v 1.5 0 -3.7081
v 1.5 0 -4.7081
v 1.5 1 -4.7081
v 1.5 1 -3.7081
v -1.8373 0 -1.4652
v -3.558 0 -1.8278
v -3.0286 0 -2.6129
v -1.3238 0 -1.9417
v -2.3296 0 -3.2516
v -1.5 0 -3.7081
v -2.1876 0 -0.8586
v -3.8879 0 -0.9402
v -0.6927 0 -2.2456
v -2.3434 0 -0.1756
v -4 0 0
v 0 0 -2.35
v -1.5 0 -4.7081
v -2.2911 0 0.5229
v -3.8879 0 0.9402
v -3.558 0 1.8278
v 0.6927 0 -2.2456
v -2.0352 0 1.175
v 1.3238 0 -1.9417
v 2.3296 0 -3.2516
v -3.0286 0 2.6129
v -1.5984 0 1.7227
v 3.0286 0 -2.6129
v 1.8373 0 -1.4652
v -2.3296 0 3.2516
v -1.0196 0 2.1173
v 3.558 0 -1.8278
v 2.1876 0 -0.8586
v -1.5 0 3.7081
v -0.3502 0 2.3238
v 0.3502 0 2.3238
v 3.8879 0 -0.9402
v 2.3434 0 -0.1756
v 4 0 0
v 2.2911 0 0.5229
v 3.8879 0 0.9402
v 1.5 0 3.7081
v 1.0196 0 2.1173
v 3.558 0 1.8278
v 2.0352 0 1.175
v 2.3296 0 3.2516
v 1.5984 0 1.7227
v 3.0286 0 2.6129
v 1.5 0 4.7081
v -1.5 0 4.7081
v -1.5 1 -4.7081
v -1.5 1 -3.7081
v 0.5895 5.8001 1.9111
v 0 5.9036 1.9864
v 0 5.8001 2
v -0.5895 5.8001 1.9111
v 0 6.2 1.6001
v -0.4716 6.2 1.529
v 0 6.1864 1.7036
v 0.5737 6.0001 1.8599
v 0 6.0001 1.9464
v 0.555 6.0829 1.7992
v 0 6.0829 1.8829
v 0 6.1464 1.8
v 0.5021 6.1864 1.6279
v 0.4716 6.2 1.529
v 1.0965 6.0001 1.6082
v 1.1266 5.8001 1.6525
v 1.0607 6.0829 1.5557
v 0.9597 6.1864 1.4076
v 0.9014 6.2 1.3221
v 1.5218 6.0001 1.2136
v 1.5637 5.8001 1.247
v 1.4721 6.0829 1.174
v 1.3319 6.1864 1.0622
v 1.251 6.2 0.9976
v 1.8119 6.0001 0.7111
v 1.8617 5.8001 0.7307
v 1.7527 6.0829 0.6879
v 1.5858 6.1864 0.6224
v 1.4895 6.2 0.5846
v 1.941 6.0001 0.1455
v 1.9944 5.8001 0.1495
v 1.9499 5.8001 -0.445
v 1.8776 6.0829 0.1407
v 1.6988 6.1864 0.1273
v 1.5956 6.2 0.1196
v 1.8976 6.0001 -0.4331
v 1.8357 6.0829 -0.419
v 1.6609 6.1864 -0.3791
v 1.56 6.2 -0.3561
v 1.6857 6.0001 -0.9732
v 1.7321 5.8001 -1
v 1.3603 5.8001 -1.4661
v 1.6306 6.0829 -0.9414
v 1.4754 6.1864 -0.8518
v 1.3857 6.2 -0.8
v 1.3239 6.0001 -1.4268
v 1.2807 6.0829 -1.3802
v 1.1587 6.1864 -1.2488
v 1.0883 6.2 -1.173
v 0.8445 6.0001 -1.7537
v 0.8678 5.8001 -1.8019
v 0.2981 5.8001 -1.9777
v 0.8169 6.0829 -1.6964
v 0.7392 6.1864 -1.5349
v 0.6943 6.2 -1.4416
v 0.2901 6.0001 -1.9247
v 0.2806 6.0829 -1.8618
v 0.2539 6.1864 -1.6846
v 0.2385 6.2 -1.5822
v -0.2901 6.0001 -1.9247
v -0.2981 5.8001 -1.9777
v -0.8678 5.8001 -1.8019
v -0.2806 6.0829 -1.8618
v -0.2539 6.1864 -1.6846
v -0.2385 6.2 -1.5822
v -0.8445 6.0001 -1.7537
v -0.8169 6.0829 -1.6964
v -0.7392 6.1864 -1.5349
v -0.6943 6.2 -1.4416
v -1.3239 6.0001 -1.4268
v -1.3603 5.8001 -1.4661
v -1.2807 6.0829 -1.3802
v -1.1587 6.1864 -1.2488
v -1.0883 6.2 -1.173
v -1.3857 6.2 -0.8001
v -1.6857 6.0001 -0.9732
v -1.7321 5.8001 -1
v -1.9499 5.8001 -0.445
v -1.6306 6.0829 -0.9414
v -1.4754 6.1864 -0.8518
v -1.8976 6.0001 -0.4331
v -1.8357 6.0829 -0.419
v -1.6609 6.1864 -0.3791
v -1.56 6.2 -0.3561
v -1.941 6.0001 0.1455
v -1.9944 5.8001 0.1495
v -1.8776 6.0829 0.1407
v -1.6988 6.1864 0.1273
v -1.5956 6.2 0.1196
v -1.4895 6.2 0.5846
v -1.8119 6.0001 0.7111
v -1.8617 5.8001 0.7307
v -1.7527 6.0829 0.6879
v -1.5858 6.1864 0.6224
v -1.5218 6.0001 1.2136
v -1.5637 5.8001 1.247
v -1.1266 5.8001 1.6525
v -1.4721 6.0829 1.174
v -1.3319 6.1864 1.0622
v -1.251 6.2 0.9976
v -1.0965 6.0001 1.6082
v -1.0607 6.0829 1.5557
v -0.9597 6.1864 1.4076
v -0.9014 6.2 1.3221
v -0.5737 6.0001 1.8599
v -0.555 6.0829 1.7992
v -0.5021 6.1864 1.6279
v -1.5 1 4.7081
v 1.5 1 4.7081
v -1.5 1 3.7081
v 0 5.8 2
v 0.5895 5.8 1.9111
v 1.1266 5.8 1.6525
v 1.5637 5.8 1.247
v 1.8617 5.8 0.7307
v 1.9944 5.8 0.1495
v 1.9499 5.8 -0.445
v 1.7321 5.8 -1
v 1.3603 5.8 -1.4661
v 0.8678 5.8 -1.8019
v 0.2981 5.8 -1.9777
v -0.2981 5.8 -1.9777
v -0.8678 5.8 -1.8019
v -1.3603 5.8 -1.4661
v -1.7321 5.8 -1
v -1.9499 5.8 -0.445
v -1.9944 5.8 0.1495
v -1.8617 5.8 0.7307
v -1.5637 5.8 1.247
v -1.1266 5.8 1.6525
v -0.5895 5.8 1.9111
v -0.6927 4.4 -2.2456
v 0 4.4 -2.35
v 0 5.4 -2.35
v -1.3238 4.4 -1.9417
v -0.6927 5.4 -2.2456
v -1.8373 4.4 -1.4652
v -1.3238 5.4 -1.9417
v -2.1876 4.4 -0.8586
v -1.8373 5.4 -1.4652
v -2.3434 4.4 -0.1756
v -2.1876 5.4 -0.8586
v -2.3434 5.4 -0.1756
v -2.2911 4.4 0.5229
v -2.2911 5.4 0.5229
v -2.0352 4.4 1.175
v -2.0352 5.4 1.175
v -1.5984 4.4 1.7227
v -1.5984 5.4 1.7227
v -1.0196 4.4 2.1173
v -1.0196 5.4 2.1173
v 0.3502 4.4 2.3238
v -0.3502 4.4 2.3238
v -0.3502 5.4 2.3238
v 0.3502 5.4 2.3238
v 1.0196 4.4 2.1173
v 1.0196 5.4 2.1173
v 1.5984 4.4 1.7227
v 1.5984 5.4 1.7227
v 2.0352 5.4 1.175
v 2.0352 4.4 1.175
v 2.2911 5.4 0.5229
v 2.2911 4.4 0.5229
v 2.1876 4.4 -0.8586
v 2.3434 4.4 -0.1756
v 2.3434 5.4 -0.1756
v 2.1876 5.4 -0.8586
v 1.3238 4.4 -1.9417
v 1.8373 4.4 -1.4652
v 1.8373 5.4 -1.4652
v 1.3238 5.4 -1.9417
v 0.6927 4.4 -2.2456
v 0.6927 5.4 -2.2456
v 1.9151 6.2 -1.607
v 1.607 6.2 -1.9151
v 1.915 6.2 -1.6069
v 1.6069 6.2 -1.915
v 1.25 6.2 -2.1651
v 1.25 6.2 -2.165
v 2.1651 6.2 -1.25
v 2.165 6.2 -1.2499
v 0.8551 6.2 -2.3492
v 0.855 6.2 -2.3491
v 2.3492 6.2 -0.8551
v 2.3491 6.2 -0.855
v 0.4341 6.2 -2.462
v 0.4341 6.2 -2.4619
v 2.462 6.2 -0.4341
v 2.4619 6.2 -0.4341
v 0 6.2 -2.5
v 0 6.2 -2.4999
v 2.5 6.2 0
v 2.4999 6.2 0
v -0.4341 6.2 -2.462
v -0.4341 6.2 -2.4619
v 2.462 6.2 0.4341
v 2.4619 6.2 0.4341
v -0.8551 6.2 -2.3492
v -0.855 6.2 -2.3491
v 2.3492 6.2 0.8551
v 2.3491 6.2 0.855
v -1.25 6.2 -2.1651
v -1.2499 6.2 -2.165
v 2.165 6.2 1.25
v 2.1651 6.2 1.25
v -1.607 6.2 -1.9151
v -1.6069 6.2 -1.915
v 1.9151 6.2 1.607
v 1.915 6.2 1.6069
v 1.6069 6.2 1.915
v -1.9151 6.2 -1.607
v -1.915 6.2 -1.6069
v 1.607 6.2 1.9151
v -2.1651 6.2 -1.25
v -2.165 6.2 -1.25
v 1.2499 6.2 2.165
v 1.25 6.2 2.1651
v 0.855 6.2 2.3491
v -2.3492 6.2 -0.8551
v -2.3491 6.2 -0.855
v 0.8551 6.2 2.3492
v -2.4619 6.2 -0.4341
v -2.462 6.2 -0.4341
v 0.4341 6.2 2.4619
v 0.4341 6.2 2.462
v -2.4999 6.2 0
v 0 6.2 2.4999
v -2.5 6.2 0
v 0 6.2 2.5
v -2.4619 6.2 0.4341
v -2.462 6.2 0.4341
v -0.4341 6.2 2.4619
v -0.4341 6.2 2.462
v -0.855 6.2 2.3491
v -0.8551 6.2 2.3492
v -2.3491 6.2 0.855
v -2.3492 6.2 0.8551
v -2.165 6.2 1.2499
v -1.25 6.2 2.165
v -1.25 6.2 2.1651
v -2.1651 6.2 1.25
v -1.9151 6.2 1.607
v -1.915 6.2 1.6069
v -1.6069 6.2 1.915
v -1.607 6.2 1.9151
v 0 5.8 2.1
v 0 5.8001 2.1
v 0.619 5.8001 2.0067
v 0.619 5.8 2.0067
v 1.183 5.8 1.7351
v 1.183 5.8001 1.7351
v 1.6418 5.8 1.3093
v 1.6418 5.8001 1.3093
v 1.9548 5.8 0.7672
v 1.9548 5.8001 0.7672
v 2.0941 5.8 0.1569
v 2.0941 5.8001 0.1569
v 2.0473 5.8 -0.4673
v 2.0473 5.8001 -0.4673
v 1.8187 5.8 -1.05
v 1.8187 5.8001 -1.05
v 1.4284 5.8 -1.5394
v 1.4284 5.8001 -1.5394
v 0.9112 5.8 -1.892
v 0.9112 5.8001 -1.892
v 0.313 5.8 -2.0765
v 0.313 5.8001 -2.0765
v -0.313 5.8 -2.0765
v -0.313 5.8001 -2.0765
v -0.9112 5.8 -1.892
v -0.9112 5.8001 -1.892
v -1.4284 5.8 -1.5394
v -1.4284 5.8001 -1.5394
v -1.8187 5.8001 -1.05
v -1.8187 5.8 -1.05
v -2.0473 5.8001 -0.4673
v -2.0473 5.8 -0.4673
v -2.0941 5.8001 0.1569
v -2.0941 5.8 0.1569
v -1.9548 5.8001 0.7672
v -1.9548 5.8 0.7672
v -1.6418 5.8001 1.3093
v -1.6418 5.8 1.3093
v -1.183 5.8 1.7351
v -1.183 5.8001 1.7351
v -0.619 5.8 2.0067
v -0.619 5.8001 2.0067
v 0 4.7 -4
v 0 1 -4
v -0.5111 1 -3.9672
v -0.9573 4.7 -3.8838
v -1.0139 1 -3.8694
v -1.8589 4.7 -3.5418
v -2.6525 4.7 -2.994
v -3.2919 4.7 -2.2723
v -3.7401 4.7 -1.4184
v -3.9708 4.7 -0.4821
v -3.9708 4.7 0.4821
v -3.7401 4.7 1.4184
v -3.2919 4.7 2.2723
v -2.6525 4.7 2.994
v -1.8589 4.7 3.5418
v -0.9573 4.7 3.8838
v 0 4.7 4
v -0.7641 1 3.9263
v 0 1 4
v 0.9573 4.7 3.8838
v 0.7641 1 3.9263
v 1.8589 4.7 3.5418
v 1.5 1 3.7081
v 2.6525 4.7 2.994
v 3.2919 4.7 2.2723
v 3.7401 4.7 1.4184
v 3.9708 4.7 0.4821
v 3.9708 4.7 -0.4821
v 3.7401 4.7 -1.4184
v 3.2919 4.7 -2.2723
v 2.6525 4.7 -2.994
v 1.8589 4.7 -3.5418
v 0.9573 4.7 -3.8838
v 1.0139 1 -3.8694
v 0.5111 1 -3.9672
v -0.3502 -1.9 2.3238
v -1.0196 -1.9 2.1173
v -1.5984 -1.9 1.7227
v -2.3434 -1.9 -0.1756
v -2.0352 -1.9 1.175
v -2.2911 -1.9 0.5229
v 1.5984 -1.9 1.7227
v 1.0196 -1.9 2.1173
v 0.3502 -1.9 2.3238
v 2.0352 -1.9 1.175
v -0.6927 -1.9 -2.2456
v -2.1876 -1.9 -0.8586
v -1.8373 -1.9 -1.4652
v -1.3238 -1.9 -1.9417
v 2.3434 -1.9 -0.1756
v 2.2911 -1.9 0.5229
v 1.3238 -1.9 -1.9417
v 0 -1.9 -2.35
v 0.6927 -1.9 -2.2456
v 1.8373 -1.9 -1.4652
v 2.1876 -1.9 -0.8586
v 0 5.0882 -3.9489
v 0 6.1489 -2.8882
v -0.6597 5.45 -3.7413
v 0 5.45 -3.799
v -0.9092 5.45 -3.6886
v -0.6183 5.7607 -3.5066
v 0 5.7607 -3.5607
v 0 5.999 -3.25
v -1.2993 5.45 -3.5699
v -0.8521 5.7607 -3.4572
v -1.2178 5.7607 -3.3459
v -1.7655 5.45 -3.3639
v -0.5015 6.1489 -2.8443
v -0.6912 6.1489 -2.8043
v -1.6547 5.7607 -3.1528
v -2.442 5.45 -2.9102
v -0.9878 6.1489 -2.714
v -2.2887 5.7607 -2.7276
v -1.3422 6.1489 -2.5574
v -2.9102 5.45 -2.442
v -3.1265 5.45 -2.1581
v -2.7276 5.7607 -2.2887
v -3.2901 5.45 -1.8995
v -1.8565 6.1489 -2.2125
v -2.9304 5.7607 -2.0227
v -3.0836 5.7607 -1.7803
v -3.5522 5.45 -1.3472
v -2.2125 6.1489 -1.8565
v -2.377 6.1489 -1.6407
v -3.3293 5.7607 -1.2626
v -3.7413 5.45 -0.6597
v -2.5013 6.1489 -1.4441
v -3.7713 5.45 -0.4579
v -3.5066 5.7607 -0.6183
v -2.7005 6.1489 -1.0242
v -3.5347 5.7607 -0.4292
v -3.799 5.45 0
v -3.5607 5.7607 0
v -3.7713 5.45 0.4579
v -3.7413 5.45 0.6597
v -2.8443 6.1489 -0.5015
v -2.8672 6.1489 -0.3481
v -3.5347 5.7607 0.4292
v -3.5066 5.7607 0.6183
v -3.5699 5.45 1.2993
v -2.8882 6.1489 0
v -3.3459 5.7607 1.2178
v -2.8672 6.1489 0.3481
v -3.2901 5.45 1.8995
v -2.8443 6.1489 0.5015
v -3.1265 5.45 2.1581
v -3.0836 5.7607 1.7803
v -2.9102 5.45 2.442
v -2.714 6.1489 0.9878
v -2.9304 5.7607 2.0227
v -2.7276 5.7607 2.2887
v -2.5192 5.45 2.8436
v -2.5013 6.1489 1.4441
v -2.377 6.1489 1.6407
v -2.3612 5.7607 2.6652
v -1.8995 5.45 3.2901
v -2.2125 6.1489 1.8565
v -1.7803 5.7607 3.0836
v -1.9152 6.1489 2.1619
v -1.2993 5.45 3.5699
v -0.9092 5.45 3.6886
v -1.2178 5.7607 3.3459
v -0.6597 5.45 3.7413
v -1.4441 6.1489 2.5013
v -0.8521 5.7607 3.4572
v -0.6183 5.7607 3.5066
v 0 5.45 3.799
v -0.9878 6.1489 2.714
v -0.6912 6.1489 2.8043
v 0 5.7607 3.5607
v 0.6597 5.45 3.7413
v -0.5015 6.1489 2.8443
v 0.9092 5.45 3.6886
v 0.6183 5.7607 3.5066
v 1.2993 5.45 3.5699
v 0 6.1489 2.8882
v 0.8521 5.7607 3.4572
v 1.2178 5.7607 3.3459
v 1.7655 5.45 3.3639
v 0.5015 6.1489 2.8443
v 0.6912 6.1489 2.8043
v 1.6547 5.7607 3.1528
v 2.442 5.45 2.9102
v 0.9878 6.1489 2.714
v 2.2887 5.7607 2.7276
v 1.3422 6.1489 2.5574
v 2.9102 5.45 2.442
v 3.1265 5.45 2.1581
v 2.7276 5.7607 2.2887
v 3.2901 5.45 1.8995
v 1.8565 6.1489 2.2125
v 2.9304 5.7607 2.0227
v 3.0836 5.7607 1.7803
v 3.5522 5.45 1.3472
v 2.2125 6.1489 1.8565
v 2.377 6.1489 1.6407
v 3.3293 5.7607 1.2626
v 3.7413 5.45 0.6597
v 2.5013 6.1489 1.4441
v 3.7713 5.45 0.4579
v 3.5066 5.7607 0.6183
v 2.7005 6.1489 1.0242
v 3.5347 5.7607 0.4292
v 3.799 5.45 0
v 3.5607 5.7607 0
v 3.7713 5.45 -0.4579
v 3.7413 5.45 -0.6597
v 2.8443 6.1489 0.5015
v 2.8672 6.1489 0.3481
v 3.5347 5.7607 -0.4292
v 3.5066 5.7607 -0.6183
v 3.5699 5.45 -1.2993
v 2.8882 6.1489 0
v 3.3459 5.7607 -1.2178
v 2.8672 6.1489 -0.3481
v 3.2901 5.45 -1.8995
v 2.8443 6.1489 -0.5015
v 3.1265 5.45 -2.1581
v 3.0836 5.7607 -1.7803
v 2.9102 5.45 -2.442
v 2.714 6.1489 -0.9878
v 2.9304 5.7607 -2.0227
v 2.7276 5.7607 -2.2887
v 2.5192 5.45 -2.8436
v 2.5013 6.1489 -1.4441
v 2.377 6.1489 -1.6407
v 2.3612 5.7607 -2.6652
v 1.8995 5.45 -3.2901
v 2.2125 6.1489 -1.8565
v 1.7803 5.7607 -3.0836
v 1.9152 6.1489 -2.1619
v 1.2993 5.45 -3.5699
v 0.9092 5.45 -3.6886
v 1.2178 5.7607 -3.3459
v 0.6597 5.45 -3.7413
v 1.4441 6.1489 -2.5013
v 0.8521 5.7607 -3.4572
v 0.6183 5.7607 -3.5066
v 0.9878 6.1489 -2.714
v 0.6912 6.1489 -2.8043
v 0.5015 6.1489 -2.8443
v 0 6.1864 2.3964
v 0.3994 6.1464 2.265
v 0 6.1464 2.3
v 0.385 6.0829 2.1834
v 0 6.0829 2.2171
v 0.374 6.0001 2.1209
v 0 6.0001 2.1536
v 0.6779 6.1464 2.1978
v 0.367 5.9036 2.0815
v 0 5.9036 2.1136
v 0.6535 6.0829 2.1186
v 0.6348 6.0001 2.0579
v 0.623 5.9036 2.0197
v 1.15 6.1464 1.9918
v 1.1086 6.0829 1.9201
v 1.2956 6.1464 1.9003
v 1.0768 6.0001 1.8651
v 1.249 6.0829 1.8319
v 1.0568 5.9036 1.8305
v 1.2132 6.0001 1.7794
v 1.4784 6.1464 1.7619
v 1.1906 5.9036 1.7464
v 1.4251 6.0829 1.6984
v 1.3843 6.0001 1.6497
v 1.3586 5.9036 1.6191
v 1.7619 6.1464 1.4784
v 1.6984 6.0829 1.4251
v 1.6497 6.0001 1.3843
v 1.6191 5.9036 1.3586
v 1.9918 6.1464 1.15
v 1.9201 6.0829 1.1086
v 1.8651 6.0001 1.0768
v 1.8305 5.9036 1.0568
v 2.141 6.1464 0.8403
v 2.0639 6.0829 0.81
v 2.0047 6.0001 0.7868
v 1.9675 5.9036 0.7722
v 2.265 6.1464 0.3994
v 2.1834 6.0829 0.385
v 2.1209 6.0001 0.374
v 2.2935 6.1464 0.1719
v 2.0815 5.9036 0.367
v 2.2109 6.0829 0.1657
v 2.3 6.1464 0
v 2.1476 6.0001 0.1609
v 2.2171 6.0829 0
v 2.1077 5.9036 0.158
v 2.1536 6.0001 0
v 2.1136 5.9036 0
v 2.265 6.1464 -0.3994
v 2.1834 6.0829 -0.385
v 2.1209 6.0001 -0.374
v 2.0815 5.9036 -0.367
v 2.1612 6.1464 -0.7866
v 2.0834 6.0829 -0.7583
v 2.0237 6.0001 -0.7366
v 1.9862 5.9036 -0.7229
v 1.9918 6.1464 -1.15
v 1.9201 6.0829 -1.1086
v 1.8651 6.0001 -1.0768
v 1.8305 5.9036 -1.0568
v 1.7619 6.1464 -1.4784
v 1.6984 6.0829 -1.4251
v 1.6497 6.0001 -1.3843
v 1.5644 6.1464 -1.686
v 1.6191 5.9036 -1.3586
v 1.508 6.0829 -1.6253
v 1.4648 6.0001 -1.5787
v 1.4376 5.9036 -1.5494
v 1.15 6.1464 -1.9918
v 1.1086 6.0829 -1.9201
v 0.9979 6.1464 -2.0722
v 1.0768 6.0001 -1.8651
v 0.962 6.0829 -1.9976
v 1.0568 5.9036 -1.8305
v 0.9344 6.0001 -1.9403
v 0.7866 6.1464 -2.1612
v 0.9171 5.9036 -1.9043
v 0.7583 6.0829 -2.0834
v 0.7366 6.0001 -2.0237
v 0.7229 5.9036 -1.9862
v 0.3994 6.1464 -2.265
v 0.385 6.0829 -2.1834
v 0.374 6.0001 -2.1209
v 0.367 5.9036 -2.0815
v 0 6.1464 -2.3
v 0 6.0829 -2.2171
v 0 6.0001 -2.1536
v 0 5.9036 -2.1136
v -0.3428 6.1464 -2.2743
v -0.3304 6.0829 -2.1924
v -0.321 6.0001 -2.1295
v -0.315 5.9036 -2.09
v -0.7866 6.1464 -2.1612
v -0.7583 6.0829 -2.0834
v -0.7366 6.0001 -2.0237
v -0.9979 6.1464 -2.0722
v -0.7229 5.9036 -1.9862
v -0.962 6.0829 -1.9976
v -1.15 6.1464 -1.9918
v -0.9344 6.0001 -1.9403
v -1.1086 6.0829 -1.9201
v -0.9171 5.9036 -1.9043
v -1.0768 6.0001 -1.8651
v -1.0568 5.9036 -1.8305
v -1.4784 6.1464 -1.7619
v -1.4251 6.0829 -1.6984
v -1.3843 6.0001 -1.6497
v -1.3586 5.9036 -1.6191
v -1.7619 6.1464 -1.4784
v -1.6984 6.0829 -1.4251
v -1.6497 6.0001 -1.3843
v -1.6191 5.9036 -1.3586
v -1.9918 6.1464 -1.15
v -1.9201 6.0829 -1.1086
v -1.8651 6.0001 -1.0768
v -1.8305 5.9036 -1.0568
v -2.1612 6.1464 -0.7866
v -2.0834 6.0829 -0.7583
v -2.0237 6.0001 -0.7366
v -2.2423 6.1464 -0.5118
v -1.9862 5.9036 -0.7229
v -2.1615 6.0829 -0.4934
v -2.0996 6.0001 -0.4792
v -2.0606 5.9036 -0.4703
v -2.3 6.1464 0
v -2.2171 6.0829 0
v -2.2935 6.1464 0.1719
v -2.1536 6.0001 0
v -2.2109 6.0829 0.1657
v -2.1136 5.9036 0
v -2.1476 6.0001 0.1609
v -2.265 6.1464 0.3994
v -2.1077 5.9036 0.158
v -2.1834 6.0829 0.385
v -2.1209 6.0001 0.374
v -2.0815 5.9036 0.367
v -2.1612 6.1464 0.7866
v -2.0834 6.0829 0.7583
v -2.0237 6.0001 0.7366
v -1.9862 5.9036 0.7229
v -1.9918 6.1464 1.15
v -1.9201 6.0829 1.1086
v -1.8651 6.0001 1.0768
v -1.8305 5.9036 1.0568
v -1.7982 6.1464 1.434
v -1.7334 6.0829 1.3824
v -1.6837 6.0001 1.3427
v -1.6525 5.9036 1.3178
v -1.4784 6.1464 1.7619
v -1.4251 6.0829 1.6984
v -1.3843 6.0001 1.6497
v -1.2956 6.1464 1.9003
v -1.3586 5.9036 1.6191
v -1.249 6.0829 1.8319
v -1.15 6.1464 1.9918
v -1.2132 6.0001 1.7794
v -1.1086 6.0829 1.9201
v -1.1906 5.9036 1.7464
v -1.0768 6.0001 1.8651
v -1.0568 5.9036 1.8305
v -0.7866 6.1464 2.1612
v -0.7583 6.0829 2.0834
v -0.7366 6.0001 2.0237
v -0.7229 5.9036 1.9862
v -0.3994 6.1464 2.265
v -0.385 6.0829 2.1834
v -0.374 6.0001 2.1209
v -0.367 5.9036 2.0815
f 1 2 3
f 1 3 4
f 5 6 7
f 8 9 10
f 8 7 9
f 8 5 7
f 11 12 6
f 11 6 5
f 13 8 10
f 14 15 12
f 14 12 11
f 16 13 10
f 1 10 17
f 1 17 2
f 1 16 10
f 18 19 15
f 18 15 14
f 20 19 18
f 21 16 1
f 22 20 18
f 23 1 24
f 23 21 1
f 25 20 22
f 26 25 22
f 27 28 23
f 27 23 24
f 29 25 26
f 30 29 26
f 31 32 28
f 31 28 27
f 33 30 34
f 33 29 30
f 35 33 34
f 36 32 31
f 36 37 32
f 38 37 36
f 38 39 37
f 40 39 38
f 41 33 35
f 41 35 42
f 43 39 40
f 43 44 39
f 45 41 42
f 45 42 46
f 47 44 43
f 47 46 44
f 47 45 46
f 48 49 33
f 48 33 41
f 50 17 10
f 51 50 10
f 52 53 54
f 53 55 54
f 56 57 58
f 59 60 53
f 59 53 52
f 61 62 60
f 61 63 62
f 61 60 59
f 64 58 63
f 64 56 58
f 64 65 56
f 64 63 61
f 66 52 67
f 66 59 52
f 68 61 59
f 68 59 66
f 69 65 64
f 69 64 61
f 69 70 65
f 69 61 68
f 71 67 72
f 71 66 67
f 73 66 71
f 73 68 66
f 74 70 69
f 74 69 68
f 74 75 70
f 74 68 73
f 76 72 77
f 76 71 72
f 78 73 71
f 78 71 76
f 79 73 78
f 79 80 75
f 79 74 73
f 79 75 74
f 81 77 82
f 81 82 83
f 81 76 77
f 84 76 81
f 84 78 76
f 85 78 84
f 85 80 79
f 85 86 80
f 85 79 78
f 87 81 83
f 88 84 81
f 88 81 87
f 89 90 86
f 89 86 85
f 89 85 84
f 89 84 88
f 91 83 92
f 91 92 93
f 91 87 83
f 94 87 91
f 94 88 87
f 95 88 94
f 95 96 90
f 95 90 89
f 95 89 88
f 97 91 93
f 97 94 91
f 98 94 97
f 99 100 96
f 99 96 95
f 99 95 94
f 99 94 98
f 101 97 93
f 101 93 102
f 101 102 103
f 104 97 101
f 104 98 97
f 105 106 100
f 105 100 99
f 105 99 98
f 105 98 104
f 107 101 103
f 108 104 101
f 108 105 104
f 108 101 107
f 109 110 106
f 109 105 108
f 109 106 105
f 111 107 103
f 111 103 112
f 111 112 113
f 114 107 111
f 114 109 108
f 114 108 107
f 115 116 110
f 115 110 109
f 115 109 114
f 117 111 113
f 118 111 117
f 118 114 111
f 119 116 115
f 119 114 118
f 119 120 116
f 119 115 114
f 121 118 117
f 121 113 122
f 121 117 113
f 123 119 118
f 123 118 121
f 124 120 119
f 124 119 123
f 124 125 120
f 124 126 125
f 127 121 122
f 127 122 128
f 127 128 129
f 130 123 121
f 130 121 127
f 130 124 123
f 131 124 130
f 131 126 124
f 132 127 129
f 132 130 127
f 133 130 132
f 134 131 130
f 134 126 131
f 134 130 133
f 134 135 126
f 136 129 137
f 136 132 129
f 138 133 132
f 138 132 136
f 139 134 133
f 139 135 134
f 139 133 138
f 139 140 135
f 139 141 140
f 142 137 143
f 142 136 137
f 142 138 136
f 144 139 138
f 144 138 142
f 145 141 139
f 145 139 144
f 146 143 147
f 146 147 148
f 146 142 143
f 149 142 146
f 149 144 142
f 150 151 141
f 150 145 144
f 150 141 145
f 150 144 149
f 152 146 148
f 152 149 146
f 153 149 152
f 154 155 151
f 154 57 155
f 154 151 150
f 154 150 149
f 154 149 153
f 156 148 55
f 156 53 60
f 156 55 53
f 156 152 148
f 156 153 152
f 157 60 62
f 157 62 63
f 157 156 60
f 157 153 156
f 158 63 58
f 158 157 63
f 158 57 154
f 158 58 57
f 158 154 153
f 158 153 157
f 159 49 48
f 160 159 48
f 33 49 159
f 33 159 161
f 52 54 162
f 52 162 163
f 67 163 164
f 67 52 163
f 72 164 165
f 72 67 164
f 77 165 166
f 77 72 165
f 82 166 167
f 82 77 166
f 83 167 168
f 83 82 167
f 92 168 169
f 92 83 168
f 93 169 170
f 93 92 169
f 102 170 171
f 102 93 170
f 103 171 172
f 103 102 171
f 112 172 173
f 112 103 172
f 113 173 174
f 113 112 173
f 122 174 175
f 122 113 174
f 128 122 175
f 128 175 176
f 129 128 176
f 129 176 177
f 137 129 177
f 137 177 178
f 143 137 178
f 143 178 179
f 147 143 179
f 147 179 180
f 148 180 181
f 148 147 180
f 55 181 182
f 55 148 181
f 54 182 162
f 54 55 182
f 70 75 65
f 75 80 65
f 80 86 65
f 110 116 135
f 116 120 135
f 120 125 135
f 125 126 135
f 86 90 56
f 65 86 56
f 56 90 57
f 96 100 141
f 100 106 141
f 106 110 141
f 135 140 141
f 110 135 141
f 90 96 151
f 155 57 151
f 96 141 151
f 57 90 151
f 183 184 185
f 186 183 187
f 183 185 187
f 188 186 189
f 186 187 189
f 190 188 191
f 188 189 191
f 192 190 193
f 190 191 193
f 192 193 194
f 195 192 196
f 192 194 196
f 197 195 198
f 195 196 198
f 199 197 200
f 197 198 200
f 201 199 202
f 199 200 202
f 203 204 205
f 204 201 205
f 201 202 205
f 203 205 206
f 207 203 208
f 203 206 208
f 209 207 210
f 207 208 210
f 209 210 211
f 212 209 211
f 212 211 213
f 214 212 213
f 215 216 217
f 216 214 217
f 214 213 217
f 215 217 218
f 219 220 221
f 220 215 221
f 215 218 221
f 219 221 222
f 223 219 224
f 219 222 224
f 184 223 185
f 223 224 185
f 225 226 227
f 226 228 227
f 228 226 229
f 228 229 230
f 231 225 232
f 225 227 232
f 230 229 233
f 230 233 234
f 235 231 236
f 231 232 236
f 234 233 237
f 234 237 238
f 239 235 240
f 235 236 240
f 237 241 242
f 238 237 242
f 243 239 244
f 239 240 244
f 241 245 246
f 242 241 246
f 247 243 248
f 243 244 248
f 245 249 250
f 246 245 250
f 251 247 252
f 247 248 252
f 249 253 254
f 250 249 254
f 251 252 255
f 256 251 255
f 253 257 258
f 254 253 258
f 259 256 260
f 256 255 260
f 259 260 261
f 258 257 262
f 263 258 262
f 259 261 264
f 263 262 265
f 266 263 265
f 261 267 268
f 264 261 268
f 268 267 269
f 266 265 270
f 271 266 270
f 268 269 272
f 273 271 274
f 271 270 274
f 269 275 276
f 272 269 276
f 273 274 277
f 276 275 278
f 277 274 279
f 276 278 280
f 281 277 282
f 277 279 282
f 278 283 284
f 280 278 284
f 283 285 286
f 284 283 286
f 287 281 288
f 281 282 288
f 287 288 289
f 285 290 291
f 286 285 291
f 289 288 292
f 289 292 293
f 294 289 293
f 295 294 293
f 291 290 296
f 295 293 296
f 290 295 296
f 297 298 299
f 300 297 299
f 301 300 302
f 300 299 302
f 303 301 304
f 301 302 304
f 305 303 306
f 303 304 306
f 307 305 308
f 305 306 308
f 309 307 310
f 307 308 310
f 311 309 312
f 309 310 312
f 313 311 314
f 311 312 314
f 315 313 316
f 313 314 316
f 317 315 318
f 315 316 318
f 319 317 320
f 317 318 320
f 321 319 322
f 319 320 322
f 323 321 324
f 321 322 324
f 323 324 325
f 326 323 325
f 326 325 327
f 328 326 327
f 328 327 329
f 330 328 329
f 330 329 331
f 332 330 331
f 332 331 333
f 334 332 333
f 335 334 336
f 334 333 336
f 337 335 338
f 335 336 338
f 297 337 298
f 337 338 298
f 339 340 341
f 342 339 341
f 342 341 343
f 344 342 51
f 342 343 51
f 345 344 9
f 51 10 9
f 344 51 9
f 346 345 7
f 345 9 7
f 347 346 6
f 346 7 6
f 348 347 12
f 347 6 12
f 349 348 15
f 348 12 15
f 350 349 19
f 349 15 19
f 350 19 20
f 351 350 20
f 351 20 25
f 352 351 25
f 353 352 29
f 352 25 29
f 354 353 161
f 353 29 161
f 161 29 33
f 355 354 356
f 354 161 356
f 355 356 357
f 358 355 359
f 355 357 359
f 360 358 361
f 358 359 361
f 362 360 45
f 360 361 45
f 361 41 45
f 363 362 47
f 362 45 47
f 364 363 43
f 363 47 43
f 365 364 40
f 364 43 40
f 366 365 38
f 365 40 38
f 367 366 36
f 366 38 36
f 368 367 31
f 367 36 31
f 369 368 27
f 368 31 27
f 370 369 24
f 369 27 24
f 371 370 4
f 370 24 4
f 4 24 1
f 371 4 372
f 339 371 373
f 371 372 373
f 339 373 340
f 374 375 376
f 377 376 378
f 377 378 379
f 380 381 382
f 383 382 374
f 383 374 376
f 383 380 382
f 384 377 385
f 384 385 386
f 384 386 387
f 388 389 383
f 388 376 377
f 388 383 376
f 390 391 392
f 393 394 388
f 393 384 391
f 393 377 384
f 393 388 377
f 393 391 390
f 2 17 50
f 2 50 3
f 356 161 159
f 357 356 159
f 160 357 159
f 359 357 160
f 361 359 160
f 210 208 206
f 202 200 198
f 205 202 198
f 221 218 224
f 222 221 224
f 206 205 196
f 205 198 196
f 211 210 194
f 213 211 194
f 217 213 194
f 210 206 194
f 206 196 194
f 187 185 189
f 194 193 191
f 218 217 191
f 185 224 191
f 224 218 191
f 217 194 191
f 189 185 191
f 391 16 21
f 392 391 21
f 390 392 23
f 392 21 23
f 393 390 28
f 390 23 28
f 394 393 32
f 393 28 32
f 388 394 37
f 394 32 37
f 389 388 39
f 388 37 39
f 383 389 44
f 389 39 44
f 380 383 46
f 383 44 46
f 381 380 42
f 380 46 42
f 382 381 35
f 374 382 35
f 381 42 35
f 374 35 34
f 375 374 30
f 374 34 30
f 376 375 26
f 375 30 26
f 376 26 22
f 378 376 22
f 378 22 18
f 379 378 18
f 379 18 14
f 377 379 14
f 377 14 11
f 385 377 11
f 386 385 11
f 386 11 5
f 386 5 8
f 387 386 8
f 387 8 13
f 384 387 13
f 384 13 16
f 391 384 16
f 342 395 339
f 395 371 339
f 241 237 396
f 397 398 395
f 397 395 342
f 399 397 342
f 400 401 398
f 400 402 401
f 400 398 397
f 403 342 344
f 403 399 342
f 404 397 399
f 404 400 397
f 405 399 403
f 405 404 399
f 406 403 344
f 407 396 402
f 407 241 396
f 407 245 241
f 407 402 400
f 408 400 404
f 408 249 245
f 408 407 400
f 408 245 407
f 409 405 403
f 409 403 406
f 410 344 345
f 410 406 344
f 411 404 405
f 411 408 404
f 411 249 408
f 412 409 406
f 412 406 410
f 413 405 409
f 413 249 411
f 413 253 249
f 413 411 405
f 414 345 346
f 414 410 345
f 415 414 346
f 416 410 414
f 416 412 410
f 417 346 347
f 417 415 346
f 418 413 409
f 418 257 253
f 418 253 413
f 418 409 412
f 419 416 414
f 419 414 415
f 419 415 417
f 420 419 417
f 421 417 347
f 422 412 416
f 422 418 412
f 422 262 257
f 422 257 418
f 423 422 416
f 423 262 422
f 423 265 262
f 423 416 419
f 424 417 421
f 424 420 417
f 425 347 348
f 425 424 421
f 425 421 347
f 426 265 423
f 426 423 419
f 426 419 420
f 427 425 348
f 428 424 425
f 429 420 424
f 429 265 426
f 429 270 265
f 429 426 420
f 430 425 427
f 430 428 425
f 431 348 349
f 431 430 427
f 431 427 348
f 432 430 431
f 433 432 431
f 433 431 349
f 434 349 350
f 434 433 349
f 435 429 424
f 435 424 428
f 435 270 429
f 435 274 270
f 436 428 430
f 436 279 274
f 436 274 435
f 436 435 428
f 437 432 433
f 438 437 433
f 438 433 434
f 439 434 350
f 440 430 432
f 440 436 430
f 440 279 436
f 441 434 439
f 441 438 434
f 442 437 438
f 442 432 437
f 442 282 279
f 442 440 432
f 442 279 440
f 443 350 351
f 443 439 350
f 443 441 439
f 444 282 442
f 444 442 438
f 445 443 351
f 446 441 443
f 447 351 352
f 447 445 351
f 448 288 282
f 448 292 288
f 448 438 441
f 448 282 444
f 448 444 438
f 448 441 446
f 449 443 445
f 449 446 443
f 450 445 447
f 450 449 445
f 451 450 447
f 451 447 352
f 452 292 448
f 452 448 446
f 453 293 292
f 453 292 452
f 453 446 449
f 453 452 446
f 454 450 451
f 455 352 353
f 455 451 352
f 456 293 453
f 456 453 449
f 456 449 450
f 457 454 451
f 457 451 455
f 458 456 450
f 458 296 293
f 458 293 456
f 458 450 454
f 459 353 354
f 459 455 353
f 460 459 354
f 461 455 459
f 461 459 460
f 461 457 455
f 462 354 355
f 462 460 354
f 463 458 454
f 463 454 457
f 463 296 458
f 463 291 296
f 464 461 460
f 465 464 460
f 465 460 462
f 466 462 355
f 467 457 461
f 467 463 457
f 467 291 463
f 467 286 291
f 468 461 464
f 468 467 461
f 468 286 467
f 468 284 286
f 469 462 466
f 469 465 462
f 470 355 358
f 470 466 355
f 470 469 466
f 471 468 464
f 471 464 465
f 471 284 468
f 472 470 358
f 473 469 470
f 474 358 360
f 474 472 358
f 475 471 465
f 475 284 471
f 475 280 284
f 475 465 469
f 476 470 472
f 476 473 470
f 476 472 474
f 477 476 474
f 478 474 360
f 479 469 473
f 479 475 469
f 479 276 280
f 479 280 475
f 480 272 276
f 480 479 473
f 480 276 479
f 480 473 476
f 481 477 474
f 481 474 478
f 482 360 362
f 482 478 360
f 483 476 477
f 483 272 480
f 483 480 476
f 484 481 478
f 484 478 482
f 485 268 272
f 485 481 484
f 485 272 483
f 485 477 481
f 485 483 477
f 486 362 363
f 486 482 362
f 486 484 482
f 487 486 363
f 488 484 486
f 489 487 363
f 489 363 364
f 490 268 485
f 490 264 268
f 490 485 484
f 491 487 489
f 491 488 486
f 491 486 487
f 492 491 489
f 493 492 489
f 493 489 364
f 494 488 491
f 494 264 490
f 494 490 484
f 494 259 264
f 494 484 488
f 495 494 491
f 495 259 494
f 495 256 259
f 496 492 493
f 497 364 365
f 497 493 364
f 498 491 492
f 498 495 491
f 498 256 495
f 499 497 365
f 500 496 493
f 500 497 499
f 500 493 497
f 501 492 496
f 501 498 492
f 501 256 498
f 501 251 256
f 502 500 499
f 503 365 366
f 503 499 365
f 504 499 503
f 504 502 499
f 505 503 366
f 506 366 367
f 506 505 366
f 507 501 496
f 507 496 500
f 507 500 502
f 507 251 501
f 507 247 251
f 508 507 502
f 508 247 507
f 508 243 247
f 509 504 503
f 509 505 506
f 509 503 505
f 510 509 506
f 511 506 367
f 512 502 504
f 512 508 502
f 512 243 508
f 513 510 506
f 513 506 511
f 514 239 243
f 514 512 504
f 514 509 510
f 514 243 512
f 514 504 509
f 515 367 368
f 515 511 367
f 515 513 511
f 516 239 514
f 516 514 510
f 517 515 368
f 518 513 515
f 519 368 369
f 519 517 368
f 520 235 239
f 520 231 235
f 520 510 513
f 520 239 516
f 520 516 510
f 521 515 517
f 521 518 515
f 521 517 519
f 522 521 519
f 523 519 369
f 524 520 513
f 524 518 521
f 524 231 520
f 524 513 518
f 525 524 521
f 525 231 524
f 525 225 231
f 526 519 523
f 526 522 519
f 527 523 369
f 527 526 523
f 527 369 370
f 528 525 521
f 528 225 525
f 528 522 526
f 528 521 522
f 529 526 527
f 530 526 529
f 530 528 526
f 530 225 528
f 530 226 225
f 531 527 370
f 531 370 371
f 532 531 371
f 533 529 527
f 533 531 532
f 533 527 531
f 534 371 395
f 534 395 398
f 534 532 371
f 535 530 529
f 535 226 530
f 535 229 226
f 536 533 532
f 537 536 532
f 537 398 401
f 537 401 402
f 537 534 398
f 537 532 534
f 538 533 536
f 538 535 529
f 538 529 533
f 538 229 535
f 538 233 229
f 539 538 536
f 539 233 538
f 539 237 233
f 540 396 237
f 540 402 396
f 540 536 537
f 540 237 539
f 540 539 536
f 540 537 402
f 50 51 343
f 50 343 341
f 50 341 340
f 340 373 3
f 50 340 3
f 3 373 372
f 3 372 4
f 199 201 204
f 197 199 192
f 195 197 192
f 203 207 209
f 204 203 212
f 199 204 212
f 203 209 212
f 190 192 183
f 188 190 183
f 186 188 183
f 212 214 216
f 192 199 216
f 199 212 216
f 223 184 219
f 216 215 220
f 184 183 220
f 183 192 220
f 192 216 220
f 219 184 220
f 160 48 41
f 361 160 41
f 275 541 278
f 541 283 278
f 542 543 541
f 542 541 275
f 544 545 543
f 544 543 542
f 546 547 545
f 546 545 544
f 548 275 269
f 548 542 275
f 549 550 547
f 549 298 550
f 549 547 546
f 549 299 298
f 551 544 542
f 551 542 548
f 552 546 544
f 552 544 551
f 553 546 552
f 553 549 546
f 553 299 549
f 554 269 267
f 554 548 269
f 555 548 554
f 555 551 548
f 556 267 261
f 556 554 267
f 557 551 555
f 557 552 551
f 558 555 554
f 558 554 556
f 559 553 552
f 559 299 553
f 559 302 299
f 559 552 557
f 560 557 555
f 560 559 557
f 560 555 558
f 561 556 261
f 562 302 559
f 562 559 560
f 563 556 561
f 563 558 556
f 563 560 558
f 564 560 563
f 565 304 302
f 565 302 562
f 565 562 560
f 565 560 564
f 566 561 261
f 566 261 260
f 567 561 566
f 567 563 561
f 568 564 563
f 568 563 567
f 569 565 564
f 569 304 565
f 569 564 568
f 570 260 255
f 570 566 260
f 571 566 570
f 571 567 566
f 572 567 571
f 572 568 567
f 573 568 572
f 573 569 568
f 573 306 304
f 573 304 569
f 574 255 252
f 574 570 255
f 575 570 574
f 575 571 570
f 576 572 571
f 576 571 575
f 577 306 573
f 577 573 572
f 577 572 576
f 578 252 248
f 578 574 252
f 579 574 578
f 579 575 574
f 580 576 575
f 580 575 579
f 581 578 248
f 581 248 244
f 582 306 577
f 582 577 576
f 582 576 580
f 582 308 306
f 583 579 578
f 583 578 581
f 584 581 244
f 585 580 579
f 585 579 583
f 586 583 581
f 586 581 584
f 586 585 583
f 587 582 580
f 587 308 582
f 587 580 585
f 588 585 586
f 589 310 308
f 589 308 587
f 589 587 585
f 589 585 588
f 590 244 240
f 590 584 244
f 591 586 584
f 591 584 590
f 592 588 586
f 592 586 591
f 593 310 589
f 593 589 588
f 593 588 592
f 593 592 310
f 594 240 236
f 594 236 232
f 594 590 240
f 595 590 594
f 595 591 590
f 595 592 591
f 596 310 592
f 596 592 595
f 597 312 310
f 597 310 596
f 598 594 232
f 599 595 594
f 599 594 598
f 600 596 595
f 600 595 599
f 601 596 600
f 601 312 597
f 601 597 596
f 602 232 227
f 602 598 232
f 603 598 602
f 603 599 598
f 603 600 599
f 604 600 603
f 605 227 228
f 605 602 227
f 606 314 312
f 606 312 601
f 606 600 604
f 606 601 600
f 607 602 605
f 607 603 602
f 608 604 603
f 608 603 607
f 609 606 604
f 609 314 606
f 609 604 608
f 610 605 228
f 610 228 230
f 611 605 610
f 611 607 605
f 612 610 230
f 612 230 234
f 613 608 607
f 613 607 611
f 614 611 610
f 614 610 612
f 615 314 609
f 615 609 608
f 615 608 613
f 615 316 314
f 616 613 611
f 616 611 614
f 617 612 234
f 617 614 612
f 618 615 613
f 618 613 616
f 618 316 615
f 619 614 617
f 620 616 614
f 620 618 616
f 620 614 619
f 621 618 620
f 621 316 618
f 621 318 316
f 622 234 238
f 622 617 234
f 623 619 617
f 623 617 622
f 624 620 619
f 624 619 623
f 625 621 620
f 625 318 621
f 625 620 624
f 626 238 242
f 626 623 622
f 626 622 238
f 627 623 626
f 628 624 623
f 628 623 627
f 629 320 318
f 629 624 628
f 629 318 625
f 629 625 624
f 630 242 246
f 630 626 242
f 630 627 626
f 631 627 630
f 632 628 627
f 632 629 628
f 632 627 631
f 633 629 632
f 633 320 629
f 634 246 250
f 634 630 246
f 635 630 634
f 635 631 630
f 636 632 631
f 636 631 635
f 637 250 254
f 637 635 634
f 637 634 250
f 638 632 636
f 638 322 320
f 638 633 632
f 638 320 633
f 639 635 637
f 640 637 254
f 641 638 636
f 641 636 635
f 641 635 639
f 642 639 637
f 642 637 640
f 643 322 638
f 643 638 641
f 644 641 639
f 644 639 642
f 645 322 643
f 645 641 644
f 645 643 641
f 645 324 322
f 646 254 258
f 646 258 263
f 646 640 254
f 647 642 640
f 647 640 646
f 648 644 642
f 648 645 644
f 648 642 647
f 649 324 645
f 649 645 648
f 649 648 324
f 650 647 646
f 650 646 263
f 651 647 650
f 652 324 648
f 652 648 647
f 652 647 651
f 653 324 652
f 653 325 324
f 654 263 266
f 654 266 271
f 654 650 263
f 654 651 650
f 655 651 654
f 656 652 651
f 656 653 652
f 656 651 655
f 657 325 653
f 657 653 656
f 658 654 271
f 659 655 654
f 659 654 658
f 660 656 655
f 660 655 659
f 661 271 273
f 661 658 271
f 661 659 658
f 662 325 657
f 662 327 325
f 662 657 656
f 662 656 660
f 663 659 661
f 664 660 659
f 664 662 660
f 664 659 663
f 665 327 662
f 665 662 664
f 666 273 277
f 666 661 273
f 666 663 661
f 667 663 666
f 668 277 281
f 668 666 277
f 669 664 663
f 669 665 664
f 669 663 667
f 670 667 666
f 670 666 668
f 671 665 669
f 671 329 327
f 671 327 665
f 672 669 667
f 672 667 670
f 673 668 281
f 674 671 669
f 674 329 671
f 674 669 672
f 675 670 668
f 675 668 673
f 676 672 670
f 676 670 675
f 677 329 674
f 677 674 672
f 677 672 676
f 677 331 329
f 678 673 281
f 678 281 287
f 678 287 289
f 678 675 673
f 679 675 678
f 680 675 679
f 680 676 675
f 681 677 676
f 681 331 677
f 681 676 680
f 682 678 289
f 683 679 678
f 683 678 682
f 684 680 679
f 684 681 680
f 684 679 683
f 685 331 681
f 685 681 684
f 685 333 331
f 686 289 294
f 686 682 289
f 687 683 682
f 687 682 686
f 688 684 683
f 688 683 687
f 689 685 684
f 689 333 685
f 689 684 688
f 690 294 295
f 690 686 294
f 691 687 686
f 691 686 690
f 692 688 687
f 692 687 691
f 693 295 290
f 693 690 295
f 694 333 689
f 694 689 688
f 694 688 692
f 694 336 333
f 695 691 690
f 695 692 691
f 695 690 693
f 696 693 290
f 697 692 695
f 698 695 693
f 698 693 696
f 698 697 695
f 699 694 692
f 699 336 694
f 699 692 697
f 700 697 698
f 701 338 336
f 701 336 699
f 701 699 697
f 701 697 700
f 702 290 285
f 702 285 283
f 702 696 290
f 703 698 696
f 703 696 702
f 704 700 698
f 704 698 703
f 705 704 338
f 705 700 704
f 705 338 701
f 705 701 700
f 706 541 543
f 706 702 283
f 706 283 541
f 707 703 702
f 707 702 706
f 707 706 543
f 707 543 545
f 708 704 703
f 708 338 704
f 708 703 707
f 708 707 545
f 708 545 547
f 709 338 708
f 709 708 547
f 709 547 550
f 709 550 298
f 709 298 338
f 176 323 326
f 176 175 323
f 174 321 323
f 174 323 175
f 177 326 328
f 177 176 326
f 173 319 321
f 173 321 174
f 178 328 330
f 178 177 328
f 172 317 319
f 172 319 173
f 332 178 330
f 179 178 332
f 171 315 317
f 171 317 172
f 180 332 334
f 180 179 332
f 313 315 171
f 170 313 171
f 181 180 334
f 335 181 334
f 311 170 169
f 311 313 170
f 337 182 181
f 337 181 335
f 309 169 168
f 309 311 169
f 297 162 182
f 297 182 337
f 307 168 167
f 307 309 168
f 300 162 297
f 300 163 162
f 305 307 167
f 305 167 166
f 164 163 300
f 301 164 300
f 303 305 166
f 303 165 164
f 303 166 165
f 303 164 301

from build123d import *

# Parameters (mm, degrees)
SKETCH3_W                = 3
SKETCH3_H                = 1
BOSS_EXTRUDE2_DEPTH      = 1
FILLET1_R                = 1.5
SKETCH5_R                = 2.1
SKETCH5_R_2              = 2
CUT_EXTRUDE1_DEPTH       = 0.4
FILLET2_R                = 0.4
BOSS_EXTRUDE3_DEPTH      = 1.9
BOSS_EXTRUDE3_DEPTH_BACK = 4.4
SKETCH6_R                = 2.35


with BuildPart() as part:
    # Sketch1 → Revolve1 (revolve)
    with BuildSketch(Plane.XY, mode=Mode.PRIVATE) as revolve1_sk:
        Polygon((4, 0), (2.35, 0), (2.35, 5.4), (0, 5.4), (0, 6.2), (4, 6.2), align=None)
    revolve(revolve1_sk.sketch.rotate(Axis((0, 0, 0), (0, 1, 0)), 90), axis=Axis((0, 0, 0), (0, 1, 0)))

    # Sketch3 → Boss-Extrude2 (add)
    with BuildSketch(Plane(origin=(0, 0, 0), x_dir=(1, 0, 0), z_dir=(0, 1, 0))):
        with Locations((0, -4.208099244)):
            Rectangle(SKETCH3_W, SKETCH3_H)
    boss_extrude2 = extrude(amount=BOSS_EXTRUDE2_DEPTH)

    # Mirror2: Boss-Extrude2 across plane
    add(boss_extrude2.mirror(Plane.XY))

    # Fillet1
    fillet1_edges = [part.edges().sort_by_distance(p)[0] for p in [
        (0, 6.2, 4),
    ]]
    fillet(fillet1_edges, radius=FILLET1_R)

    # Sketch5 → Cut-Extrude1 (cut)
    with BuildSketch(Plane(origin=(0, 6.2, 0), x_dir=(1, 0, 0), z_dir=(0, 1, 0))):
        with Locations(Location((0, 0, 0), (0, 0, 270))):
            Circle(SKETCH5_R)
        with Locations(Location((0, 0, 0), (0, 0, 270))):
            Circle(SKETCH5_R_2, mode=Mode.SUBTRACT)
    extrude(amount=-CUT_EXTRUDE1_DEPTH, mode=Mode.SUBTRACT)

    # Fillet2
    fillet2_edges = [part.edges().sort_by_distance(p)[0] for p in [
        (0, 6.2, -2.1),
        (0, 6.2, -2),
    ]]
    fillet(fillet2_edges, radius=FILLET2_R - 0.0001)  # a hair under: the kernel refuses the full size

    # Sketch6 → Boss-Extrude3 (add, two sides: drawn at the far end of the back side and taken through both)
    with BuildSketch(Plane.XZ.offset(-BOSS_EXTRUDE3_DEPTH_BACK)):
        with Locations(Location((0, 0, 0), (0, 0, 270))):
            Circle(SKETCH6_R)
    extrude(amount=BOSS_EXTRUDE3_DEPTH + BOSS_EXTRUDE3_DEPTH_BACK)


solid = part.part
